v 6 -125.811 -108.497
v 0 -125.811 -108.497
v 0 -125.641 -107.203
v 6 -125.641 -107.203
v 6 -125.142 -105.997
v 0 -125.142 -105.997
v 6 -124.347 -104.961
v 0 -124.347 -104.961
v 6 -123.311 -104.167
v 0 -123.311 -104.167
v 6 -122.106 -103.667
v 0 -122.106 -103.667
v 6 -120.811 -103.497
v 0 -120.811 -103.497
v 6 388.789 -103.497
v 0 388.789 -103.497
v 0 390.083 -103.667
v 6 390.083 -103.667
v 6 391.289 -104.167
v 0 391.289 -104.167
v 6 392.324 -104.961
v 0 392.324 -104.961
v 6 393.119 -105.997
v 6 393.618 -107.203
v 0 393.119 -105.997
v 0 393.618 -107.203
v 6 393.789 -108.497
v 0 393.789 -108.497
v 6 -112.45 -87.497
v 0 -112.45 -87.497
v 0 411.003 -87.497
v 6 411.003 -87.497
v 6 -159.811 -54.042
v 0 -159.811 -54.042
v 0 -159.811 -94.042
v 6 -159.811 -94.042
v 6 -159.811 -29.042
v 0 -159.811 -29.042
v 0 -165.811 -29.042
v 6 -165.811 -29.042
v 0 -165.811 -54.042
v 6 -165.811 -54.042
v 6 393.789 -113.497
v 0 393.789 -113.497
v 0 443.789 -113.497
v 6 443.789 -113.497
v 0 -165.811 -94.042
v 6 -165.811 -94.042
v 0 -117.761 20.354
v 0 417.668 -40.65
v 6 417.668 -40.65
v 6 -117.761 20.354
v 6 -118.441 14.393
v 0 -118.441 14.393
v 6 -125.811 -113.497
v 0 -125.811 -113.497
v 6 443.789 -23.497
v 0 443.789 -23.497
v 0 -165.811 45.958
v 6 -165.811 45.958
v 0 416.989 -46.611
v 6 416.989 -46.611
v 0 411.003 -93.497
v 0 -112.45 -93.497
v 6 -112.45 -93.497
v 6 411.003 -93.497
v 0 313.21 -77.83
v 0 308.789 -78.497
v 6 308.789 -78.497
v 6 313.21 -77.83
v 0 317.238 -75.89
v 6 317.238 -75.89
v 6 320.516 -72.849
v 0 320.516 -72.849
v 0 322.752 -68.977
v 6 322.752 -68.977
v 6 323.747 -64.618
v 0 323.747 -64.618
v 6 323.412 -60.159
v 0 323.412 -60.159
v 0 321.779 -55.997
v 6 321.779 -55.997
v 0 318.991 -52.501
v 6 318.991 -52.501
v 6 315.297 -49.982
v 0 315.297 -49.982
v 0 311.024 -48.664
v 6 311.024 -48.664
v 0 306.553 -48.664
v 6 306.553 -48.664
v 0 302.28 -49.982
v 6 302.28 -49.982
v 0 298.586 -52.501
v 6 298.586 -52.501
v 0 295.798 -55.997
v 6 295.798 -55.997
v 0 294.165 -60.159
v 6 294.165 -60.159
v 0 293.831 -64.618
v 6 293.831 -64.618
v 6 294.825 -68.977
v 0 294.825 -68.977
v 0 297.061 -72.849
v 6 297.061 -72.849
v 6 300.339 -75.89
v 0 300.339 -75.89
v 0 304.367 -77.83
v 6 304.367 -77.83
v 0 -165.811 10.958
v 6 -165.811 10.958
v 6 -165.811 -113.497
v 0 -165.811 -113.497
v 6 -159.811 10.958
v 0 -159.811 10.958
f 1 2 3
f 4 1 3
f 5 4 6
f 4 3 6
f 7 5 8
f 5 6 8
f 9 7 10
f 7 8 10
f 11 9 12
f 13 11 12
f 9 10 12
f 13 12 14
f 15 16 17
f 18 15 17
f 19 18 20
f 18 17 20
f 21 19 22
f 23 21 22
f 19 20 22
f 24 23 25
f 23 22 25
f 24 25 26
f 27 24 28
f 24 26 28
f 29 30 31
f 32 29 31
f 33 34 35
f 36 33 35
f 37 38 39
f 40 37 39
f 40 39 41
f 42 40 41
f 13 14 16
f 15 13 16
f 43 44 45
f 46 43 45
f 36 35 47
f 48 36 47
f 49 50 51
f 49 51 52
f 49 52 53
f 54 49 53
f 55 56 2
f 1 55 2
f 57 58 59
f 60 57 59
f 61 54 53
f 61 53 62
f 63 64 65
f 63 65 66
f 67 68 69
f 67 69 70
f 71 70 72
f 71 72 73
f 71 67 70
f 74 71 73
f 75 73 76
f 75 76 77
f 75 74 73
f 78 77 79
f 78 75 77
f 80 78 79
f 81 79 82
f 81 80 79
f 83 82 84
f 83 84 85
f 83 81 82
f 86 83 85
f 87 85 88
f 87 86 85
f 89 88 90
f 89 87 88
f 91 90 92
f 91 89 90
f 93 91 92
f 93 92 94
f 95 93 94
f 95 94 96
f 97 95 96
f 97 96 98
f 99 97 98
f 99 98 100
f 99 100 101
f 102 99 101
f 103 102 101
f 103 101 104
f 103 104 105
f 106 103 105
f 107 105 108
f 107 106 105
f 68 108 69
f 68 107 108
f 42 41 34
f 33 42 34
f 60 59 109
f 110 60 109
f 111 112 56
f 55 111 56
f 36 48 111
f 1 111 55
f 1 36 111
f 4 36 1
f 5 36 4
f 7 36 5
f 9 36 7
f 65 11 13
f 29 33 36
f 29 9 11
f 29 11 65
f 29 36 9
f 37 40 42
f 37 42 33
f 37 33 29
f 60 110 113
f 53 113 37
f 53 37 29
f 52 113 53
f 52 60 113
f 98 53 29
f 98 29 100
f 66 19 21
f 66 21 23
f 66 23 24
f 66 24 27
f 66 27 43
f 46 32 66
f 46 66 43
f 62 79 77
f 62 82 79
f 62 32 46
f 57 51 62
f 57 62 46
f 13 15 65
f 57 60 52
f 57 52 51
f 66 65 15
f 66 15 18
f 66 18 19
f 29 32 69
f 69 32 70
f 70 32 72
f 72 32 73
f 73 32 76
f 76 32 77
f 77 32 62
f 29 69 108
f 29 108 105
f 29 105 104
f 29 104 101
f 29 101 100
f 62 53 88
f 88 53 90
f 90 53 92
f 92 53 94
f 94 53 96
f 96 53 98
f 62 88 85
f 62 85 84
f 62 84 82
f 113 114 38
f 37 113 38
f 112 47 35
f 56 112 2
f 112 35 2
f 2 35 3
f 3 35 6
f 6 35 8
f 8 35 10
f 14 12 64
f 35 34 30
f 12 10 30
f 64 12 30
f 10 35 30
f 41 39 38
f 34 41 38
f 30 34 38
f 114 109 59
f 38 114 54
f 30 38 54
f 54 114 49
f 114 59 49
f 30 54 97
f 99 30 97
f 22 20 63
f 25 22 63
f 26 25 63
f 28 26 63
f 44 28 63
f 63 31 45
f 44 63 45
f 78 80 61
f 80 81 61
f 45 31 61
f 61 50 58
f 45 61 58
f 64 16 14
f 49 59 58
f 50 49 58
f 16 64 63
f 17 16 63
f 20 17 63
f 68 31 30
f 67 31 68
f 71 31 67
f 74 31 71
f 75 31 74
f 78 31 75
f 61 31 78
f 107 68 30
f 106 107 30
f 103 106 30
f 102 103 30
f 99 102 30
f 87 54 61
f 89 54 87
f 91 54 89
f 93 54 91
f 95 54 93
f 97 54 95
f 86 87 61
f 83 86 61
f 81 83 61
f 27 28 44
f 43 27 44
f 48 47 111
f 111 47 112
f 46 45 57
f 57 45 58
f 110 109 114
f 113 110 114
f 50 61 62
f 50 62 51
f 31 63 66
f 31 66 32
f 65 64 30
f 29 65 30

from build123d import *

# Parameters (mm, degrees)
SKETCH1_R           = 15
SKETCH1_W           = 523.453034516
SKETCH1_H           = 6
BOSS_EXTRUDE1_DEPTH = 6


with BuildPart() as part:
    # Sketch1 → Boss-Extrude1 (new body)
    with BuildSketch(Plane.YZ):
        with BuildLine():
            Line((-165.811435327, 45.958456005), (-165.811435327, 10.958456005))
            Line((-165.811435327, 10.958456005), (-159.811435327, 10.958456005))
            Line((-159.811435327, 10.958456005), (-159.811435327, -29.041543995))
            Line((-159.811435327, -29.041543995), (-165.811435327, -29.041543995))
            Line((-165.811435327, -29.041543995), (-165.811435327, -54.041543995))
            Line((-165.811435327, -54.041543995), (-159.811435327, -54.041543995))
            Line((-159.811435327, -54.041543995), (-159.811435327, -94.041543995))
            Line((-159.811435327, -94.041543995), (-165.811435327, -94.041543995))
            Line((-165.811435327, -94.041543995), (-165.811435327, -113.496690816))
            Line((-165.811435327, -113.496690816), (-125.811435327, -113.496690816))
            Line((-125.811435327, -113.496690816), (-125.811435327, -108.496690816))
            ThreePointArc((-125.811435327, -108.496690816), (-124.346969233, -104.96115691), (-120.811435327, -103.496690816))
            Line((-120.811435327, -103.496690816), (388.788564673, -103.496690816))
            ThreePointArc((388.788564673, -103.496690816), (392.324098579, -104.96115691), (393.788564673, -108.496690816))
            Line((393.788564673, -108.496690816), (393.788564673, -113.496690816))
            Line((393.788564673, -113.496690816), (443.788564673, -113.496690816))
            Line((443.788564673, -113.496690816), (443.788564673, -23.496690816))
            Line((443.788564673, -23.496690816), (-165.811435327, 45.958456005))
        make_face()
        with Locations(Location((308.788564673, -63.496690816, 0), (0, 0, 270))):
            Circle(SKETCH1_R, mode=Mode.SUBTRACT)
        Polygon((-117.76145538, 20.354457657), (-118.440674663, 14.393026523), (416.988579422, -46.611431244), (417.667798704, -40.65000011), align=None, mode=Mode.SUBTRACT)
        with Locations((149.276829124, -90.496690816)):
            Rectangle(SKETCH1_W, SKETCH1_H, mode=Mode.SUBTRACT)
    extrude(amount=BOSS_EXTRUDE1_DEPTH)


solid = part.part
